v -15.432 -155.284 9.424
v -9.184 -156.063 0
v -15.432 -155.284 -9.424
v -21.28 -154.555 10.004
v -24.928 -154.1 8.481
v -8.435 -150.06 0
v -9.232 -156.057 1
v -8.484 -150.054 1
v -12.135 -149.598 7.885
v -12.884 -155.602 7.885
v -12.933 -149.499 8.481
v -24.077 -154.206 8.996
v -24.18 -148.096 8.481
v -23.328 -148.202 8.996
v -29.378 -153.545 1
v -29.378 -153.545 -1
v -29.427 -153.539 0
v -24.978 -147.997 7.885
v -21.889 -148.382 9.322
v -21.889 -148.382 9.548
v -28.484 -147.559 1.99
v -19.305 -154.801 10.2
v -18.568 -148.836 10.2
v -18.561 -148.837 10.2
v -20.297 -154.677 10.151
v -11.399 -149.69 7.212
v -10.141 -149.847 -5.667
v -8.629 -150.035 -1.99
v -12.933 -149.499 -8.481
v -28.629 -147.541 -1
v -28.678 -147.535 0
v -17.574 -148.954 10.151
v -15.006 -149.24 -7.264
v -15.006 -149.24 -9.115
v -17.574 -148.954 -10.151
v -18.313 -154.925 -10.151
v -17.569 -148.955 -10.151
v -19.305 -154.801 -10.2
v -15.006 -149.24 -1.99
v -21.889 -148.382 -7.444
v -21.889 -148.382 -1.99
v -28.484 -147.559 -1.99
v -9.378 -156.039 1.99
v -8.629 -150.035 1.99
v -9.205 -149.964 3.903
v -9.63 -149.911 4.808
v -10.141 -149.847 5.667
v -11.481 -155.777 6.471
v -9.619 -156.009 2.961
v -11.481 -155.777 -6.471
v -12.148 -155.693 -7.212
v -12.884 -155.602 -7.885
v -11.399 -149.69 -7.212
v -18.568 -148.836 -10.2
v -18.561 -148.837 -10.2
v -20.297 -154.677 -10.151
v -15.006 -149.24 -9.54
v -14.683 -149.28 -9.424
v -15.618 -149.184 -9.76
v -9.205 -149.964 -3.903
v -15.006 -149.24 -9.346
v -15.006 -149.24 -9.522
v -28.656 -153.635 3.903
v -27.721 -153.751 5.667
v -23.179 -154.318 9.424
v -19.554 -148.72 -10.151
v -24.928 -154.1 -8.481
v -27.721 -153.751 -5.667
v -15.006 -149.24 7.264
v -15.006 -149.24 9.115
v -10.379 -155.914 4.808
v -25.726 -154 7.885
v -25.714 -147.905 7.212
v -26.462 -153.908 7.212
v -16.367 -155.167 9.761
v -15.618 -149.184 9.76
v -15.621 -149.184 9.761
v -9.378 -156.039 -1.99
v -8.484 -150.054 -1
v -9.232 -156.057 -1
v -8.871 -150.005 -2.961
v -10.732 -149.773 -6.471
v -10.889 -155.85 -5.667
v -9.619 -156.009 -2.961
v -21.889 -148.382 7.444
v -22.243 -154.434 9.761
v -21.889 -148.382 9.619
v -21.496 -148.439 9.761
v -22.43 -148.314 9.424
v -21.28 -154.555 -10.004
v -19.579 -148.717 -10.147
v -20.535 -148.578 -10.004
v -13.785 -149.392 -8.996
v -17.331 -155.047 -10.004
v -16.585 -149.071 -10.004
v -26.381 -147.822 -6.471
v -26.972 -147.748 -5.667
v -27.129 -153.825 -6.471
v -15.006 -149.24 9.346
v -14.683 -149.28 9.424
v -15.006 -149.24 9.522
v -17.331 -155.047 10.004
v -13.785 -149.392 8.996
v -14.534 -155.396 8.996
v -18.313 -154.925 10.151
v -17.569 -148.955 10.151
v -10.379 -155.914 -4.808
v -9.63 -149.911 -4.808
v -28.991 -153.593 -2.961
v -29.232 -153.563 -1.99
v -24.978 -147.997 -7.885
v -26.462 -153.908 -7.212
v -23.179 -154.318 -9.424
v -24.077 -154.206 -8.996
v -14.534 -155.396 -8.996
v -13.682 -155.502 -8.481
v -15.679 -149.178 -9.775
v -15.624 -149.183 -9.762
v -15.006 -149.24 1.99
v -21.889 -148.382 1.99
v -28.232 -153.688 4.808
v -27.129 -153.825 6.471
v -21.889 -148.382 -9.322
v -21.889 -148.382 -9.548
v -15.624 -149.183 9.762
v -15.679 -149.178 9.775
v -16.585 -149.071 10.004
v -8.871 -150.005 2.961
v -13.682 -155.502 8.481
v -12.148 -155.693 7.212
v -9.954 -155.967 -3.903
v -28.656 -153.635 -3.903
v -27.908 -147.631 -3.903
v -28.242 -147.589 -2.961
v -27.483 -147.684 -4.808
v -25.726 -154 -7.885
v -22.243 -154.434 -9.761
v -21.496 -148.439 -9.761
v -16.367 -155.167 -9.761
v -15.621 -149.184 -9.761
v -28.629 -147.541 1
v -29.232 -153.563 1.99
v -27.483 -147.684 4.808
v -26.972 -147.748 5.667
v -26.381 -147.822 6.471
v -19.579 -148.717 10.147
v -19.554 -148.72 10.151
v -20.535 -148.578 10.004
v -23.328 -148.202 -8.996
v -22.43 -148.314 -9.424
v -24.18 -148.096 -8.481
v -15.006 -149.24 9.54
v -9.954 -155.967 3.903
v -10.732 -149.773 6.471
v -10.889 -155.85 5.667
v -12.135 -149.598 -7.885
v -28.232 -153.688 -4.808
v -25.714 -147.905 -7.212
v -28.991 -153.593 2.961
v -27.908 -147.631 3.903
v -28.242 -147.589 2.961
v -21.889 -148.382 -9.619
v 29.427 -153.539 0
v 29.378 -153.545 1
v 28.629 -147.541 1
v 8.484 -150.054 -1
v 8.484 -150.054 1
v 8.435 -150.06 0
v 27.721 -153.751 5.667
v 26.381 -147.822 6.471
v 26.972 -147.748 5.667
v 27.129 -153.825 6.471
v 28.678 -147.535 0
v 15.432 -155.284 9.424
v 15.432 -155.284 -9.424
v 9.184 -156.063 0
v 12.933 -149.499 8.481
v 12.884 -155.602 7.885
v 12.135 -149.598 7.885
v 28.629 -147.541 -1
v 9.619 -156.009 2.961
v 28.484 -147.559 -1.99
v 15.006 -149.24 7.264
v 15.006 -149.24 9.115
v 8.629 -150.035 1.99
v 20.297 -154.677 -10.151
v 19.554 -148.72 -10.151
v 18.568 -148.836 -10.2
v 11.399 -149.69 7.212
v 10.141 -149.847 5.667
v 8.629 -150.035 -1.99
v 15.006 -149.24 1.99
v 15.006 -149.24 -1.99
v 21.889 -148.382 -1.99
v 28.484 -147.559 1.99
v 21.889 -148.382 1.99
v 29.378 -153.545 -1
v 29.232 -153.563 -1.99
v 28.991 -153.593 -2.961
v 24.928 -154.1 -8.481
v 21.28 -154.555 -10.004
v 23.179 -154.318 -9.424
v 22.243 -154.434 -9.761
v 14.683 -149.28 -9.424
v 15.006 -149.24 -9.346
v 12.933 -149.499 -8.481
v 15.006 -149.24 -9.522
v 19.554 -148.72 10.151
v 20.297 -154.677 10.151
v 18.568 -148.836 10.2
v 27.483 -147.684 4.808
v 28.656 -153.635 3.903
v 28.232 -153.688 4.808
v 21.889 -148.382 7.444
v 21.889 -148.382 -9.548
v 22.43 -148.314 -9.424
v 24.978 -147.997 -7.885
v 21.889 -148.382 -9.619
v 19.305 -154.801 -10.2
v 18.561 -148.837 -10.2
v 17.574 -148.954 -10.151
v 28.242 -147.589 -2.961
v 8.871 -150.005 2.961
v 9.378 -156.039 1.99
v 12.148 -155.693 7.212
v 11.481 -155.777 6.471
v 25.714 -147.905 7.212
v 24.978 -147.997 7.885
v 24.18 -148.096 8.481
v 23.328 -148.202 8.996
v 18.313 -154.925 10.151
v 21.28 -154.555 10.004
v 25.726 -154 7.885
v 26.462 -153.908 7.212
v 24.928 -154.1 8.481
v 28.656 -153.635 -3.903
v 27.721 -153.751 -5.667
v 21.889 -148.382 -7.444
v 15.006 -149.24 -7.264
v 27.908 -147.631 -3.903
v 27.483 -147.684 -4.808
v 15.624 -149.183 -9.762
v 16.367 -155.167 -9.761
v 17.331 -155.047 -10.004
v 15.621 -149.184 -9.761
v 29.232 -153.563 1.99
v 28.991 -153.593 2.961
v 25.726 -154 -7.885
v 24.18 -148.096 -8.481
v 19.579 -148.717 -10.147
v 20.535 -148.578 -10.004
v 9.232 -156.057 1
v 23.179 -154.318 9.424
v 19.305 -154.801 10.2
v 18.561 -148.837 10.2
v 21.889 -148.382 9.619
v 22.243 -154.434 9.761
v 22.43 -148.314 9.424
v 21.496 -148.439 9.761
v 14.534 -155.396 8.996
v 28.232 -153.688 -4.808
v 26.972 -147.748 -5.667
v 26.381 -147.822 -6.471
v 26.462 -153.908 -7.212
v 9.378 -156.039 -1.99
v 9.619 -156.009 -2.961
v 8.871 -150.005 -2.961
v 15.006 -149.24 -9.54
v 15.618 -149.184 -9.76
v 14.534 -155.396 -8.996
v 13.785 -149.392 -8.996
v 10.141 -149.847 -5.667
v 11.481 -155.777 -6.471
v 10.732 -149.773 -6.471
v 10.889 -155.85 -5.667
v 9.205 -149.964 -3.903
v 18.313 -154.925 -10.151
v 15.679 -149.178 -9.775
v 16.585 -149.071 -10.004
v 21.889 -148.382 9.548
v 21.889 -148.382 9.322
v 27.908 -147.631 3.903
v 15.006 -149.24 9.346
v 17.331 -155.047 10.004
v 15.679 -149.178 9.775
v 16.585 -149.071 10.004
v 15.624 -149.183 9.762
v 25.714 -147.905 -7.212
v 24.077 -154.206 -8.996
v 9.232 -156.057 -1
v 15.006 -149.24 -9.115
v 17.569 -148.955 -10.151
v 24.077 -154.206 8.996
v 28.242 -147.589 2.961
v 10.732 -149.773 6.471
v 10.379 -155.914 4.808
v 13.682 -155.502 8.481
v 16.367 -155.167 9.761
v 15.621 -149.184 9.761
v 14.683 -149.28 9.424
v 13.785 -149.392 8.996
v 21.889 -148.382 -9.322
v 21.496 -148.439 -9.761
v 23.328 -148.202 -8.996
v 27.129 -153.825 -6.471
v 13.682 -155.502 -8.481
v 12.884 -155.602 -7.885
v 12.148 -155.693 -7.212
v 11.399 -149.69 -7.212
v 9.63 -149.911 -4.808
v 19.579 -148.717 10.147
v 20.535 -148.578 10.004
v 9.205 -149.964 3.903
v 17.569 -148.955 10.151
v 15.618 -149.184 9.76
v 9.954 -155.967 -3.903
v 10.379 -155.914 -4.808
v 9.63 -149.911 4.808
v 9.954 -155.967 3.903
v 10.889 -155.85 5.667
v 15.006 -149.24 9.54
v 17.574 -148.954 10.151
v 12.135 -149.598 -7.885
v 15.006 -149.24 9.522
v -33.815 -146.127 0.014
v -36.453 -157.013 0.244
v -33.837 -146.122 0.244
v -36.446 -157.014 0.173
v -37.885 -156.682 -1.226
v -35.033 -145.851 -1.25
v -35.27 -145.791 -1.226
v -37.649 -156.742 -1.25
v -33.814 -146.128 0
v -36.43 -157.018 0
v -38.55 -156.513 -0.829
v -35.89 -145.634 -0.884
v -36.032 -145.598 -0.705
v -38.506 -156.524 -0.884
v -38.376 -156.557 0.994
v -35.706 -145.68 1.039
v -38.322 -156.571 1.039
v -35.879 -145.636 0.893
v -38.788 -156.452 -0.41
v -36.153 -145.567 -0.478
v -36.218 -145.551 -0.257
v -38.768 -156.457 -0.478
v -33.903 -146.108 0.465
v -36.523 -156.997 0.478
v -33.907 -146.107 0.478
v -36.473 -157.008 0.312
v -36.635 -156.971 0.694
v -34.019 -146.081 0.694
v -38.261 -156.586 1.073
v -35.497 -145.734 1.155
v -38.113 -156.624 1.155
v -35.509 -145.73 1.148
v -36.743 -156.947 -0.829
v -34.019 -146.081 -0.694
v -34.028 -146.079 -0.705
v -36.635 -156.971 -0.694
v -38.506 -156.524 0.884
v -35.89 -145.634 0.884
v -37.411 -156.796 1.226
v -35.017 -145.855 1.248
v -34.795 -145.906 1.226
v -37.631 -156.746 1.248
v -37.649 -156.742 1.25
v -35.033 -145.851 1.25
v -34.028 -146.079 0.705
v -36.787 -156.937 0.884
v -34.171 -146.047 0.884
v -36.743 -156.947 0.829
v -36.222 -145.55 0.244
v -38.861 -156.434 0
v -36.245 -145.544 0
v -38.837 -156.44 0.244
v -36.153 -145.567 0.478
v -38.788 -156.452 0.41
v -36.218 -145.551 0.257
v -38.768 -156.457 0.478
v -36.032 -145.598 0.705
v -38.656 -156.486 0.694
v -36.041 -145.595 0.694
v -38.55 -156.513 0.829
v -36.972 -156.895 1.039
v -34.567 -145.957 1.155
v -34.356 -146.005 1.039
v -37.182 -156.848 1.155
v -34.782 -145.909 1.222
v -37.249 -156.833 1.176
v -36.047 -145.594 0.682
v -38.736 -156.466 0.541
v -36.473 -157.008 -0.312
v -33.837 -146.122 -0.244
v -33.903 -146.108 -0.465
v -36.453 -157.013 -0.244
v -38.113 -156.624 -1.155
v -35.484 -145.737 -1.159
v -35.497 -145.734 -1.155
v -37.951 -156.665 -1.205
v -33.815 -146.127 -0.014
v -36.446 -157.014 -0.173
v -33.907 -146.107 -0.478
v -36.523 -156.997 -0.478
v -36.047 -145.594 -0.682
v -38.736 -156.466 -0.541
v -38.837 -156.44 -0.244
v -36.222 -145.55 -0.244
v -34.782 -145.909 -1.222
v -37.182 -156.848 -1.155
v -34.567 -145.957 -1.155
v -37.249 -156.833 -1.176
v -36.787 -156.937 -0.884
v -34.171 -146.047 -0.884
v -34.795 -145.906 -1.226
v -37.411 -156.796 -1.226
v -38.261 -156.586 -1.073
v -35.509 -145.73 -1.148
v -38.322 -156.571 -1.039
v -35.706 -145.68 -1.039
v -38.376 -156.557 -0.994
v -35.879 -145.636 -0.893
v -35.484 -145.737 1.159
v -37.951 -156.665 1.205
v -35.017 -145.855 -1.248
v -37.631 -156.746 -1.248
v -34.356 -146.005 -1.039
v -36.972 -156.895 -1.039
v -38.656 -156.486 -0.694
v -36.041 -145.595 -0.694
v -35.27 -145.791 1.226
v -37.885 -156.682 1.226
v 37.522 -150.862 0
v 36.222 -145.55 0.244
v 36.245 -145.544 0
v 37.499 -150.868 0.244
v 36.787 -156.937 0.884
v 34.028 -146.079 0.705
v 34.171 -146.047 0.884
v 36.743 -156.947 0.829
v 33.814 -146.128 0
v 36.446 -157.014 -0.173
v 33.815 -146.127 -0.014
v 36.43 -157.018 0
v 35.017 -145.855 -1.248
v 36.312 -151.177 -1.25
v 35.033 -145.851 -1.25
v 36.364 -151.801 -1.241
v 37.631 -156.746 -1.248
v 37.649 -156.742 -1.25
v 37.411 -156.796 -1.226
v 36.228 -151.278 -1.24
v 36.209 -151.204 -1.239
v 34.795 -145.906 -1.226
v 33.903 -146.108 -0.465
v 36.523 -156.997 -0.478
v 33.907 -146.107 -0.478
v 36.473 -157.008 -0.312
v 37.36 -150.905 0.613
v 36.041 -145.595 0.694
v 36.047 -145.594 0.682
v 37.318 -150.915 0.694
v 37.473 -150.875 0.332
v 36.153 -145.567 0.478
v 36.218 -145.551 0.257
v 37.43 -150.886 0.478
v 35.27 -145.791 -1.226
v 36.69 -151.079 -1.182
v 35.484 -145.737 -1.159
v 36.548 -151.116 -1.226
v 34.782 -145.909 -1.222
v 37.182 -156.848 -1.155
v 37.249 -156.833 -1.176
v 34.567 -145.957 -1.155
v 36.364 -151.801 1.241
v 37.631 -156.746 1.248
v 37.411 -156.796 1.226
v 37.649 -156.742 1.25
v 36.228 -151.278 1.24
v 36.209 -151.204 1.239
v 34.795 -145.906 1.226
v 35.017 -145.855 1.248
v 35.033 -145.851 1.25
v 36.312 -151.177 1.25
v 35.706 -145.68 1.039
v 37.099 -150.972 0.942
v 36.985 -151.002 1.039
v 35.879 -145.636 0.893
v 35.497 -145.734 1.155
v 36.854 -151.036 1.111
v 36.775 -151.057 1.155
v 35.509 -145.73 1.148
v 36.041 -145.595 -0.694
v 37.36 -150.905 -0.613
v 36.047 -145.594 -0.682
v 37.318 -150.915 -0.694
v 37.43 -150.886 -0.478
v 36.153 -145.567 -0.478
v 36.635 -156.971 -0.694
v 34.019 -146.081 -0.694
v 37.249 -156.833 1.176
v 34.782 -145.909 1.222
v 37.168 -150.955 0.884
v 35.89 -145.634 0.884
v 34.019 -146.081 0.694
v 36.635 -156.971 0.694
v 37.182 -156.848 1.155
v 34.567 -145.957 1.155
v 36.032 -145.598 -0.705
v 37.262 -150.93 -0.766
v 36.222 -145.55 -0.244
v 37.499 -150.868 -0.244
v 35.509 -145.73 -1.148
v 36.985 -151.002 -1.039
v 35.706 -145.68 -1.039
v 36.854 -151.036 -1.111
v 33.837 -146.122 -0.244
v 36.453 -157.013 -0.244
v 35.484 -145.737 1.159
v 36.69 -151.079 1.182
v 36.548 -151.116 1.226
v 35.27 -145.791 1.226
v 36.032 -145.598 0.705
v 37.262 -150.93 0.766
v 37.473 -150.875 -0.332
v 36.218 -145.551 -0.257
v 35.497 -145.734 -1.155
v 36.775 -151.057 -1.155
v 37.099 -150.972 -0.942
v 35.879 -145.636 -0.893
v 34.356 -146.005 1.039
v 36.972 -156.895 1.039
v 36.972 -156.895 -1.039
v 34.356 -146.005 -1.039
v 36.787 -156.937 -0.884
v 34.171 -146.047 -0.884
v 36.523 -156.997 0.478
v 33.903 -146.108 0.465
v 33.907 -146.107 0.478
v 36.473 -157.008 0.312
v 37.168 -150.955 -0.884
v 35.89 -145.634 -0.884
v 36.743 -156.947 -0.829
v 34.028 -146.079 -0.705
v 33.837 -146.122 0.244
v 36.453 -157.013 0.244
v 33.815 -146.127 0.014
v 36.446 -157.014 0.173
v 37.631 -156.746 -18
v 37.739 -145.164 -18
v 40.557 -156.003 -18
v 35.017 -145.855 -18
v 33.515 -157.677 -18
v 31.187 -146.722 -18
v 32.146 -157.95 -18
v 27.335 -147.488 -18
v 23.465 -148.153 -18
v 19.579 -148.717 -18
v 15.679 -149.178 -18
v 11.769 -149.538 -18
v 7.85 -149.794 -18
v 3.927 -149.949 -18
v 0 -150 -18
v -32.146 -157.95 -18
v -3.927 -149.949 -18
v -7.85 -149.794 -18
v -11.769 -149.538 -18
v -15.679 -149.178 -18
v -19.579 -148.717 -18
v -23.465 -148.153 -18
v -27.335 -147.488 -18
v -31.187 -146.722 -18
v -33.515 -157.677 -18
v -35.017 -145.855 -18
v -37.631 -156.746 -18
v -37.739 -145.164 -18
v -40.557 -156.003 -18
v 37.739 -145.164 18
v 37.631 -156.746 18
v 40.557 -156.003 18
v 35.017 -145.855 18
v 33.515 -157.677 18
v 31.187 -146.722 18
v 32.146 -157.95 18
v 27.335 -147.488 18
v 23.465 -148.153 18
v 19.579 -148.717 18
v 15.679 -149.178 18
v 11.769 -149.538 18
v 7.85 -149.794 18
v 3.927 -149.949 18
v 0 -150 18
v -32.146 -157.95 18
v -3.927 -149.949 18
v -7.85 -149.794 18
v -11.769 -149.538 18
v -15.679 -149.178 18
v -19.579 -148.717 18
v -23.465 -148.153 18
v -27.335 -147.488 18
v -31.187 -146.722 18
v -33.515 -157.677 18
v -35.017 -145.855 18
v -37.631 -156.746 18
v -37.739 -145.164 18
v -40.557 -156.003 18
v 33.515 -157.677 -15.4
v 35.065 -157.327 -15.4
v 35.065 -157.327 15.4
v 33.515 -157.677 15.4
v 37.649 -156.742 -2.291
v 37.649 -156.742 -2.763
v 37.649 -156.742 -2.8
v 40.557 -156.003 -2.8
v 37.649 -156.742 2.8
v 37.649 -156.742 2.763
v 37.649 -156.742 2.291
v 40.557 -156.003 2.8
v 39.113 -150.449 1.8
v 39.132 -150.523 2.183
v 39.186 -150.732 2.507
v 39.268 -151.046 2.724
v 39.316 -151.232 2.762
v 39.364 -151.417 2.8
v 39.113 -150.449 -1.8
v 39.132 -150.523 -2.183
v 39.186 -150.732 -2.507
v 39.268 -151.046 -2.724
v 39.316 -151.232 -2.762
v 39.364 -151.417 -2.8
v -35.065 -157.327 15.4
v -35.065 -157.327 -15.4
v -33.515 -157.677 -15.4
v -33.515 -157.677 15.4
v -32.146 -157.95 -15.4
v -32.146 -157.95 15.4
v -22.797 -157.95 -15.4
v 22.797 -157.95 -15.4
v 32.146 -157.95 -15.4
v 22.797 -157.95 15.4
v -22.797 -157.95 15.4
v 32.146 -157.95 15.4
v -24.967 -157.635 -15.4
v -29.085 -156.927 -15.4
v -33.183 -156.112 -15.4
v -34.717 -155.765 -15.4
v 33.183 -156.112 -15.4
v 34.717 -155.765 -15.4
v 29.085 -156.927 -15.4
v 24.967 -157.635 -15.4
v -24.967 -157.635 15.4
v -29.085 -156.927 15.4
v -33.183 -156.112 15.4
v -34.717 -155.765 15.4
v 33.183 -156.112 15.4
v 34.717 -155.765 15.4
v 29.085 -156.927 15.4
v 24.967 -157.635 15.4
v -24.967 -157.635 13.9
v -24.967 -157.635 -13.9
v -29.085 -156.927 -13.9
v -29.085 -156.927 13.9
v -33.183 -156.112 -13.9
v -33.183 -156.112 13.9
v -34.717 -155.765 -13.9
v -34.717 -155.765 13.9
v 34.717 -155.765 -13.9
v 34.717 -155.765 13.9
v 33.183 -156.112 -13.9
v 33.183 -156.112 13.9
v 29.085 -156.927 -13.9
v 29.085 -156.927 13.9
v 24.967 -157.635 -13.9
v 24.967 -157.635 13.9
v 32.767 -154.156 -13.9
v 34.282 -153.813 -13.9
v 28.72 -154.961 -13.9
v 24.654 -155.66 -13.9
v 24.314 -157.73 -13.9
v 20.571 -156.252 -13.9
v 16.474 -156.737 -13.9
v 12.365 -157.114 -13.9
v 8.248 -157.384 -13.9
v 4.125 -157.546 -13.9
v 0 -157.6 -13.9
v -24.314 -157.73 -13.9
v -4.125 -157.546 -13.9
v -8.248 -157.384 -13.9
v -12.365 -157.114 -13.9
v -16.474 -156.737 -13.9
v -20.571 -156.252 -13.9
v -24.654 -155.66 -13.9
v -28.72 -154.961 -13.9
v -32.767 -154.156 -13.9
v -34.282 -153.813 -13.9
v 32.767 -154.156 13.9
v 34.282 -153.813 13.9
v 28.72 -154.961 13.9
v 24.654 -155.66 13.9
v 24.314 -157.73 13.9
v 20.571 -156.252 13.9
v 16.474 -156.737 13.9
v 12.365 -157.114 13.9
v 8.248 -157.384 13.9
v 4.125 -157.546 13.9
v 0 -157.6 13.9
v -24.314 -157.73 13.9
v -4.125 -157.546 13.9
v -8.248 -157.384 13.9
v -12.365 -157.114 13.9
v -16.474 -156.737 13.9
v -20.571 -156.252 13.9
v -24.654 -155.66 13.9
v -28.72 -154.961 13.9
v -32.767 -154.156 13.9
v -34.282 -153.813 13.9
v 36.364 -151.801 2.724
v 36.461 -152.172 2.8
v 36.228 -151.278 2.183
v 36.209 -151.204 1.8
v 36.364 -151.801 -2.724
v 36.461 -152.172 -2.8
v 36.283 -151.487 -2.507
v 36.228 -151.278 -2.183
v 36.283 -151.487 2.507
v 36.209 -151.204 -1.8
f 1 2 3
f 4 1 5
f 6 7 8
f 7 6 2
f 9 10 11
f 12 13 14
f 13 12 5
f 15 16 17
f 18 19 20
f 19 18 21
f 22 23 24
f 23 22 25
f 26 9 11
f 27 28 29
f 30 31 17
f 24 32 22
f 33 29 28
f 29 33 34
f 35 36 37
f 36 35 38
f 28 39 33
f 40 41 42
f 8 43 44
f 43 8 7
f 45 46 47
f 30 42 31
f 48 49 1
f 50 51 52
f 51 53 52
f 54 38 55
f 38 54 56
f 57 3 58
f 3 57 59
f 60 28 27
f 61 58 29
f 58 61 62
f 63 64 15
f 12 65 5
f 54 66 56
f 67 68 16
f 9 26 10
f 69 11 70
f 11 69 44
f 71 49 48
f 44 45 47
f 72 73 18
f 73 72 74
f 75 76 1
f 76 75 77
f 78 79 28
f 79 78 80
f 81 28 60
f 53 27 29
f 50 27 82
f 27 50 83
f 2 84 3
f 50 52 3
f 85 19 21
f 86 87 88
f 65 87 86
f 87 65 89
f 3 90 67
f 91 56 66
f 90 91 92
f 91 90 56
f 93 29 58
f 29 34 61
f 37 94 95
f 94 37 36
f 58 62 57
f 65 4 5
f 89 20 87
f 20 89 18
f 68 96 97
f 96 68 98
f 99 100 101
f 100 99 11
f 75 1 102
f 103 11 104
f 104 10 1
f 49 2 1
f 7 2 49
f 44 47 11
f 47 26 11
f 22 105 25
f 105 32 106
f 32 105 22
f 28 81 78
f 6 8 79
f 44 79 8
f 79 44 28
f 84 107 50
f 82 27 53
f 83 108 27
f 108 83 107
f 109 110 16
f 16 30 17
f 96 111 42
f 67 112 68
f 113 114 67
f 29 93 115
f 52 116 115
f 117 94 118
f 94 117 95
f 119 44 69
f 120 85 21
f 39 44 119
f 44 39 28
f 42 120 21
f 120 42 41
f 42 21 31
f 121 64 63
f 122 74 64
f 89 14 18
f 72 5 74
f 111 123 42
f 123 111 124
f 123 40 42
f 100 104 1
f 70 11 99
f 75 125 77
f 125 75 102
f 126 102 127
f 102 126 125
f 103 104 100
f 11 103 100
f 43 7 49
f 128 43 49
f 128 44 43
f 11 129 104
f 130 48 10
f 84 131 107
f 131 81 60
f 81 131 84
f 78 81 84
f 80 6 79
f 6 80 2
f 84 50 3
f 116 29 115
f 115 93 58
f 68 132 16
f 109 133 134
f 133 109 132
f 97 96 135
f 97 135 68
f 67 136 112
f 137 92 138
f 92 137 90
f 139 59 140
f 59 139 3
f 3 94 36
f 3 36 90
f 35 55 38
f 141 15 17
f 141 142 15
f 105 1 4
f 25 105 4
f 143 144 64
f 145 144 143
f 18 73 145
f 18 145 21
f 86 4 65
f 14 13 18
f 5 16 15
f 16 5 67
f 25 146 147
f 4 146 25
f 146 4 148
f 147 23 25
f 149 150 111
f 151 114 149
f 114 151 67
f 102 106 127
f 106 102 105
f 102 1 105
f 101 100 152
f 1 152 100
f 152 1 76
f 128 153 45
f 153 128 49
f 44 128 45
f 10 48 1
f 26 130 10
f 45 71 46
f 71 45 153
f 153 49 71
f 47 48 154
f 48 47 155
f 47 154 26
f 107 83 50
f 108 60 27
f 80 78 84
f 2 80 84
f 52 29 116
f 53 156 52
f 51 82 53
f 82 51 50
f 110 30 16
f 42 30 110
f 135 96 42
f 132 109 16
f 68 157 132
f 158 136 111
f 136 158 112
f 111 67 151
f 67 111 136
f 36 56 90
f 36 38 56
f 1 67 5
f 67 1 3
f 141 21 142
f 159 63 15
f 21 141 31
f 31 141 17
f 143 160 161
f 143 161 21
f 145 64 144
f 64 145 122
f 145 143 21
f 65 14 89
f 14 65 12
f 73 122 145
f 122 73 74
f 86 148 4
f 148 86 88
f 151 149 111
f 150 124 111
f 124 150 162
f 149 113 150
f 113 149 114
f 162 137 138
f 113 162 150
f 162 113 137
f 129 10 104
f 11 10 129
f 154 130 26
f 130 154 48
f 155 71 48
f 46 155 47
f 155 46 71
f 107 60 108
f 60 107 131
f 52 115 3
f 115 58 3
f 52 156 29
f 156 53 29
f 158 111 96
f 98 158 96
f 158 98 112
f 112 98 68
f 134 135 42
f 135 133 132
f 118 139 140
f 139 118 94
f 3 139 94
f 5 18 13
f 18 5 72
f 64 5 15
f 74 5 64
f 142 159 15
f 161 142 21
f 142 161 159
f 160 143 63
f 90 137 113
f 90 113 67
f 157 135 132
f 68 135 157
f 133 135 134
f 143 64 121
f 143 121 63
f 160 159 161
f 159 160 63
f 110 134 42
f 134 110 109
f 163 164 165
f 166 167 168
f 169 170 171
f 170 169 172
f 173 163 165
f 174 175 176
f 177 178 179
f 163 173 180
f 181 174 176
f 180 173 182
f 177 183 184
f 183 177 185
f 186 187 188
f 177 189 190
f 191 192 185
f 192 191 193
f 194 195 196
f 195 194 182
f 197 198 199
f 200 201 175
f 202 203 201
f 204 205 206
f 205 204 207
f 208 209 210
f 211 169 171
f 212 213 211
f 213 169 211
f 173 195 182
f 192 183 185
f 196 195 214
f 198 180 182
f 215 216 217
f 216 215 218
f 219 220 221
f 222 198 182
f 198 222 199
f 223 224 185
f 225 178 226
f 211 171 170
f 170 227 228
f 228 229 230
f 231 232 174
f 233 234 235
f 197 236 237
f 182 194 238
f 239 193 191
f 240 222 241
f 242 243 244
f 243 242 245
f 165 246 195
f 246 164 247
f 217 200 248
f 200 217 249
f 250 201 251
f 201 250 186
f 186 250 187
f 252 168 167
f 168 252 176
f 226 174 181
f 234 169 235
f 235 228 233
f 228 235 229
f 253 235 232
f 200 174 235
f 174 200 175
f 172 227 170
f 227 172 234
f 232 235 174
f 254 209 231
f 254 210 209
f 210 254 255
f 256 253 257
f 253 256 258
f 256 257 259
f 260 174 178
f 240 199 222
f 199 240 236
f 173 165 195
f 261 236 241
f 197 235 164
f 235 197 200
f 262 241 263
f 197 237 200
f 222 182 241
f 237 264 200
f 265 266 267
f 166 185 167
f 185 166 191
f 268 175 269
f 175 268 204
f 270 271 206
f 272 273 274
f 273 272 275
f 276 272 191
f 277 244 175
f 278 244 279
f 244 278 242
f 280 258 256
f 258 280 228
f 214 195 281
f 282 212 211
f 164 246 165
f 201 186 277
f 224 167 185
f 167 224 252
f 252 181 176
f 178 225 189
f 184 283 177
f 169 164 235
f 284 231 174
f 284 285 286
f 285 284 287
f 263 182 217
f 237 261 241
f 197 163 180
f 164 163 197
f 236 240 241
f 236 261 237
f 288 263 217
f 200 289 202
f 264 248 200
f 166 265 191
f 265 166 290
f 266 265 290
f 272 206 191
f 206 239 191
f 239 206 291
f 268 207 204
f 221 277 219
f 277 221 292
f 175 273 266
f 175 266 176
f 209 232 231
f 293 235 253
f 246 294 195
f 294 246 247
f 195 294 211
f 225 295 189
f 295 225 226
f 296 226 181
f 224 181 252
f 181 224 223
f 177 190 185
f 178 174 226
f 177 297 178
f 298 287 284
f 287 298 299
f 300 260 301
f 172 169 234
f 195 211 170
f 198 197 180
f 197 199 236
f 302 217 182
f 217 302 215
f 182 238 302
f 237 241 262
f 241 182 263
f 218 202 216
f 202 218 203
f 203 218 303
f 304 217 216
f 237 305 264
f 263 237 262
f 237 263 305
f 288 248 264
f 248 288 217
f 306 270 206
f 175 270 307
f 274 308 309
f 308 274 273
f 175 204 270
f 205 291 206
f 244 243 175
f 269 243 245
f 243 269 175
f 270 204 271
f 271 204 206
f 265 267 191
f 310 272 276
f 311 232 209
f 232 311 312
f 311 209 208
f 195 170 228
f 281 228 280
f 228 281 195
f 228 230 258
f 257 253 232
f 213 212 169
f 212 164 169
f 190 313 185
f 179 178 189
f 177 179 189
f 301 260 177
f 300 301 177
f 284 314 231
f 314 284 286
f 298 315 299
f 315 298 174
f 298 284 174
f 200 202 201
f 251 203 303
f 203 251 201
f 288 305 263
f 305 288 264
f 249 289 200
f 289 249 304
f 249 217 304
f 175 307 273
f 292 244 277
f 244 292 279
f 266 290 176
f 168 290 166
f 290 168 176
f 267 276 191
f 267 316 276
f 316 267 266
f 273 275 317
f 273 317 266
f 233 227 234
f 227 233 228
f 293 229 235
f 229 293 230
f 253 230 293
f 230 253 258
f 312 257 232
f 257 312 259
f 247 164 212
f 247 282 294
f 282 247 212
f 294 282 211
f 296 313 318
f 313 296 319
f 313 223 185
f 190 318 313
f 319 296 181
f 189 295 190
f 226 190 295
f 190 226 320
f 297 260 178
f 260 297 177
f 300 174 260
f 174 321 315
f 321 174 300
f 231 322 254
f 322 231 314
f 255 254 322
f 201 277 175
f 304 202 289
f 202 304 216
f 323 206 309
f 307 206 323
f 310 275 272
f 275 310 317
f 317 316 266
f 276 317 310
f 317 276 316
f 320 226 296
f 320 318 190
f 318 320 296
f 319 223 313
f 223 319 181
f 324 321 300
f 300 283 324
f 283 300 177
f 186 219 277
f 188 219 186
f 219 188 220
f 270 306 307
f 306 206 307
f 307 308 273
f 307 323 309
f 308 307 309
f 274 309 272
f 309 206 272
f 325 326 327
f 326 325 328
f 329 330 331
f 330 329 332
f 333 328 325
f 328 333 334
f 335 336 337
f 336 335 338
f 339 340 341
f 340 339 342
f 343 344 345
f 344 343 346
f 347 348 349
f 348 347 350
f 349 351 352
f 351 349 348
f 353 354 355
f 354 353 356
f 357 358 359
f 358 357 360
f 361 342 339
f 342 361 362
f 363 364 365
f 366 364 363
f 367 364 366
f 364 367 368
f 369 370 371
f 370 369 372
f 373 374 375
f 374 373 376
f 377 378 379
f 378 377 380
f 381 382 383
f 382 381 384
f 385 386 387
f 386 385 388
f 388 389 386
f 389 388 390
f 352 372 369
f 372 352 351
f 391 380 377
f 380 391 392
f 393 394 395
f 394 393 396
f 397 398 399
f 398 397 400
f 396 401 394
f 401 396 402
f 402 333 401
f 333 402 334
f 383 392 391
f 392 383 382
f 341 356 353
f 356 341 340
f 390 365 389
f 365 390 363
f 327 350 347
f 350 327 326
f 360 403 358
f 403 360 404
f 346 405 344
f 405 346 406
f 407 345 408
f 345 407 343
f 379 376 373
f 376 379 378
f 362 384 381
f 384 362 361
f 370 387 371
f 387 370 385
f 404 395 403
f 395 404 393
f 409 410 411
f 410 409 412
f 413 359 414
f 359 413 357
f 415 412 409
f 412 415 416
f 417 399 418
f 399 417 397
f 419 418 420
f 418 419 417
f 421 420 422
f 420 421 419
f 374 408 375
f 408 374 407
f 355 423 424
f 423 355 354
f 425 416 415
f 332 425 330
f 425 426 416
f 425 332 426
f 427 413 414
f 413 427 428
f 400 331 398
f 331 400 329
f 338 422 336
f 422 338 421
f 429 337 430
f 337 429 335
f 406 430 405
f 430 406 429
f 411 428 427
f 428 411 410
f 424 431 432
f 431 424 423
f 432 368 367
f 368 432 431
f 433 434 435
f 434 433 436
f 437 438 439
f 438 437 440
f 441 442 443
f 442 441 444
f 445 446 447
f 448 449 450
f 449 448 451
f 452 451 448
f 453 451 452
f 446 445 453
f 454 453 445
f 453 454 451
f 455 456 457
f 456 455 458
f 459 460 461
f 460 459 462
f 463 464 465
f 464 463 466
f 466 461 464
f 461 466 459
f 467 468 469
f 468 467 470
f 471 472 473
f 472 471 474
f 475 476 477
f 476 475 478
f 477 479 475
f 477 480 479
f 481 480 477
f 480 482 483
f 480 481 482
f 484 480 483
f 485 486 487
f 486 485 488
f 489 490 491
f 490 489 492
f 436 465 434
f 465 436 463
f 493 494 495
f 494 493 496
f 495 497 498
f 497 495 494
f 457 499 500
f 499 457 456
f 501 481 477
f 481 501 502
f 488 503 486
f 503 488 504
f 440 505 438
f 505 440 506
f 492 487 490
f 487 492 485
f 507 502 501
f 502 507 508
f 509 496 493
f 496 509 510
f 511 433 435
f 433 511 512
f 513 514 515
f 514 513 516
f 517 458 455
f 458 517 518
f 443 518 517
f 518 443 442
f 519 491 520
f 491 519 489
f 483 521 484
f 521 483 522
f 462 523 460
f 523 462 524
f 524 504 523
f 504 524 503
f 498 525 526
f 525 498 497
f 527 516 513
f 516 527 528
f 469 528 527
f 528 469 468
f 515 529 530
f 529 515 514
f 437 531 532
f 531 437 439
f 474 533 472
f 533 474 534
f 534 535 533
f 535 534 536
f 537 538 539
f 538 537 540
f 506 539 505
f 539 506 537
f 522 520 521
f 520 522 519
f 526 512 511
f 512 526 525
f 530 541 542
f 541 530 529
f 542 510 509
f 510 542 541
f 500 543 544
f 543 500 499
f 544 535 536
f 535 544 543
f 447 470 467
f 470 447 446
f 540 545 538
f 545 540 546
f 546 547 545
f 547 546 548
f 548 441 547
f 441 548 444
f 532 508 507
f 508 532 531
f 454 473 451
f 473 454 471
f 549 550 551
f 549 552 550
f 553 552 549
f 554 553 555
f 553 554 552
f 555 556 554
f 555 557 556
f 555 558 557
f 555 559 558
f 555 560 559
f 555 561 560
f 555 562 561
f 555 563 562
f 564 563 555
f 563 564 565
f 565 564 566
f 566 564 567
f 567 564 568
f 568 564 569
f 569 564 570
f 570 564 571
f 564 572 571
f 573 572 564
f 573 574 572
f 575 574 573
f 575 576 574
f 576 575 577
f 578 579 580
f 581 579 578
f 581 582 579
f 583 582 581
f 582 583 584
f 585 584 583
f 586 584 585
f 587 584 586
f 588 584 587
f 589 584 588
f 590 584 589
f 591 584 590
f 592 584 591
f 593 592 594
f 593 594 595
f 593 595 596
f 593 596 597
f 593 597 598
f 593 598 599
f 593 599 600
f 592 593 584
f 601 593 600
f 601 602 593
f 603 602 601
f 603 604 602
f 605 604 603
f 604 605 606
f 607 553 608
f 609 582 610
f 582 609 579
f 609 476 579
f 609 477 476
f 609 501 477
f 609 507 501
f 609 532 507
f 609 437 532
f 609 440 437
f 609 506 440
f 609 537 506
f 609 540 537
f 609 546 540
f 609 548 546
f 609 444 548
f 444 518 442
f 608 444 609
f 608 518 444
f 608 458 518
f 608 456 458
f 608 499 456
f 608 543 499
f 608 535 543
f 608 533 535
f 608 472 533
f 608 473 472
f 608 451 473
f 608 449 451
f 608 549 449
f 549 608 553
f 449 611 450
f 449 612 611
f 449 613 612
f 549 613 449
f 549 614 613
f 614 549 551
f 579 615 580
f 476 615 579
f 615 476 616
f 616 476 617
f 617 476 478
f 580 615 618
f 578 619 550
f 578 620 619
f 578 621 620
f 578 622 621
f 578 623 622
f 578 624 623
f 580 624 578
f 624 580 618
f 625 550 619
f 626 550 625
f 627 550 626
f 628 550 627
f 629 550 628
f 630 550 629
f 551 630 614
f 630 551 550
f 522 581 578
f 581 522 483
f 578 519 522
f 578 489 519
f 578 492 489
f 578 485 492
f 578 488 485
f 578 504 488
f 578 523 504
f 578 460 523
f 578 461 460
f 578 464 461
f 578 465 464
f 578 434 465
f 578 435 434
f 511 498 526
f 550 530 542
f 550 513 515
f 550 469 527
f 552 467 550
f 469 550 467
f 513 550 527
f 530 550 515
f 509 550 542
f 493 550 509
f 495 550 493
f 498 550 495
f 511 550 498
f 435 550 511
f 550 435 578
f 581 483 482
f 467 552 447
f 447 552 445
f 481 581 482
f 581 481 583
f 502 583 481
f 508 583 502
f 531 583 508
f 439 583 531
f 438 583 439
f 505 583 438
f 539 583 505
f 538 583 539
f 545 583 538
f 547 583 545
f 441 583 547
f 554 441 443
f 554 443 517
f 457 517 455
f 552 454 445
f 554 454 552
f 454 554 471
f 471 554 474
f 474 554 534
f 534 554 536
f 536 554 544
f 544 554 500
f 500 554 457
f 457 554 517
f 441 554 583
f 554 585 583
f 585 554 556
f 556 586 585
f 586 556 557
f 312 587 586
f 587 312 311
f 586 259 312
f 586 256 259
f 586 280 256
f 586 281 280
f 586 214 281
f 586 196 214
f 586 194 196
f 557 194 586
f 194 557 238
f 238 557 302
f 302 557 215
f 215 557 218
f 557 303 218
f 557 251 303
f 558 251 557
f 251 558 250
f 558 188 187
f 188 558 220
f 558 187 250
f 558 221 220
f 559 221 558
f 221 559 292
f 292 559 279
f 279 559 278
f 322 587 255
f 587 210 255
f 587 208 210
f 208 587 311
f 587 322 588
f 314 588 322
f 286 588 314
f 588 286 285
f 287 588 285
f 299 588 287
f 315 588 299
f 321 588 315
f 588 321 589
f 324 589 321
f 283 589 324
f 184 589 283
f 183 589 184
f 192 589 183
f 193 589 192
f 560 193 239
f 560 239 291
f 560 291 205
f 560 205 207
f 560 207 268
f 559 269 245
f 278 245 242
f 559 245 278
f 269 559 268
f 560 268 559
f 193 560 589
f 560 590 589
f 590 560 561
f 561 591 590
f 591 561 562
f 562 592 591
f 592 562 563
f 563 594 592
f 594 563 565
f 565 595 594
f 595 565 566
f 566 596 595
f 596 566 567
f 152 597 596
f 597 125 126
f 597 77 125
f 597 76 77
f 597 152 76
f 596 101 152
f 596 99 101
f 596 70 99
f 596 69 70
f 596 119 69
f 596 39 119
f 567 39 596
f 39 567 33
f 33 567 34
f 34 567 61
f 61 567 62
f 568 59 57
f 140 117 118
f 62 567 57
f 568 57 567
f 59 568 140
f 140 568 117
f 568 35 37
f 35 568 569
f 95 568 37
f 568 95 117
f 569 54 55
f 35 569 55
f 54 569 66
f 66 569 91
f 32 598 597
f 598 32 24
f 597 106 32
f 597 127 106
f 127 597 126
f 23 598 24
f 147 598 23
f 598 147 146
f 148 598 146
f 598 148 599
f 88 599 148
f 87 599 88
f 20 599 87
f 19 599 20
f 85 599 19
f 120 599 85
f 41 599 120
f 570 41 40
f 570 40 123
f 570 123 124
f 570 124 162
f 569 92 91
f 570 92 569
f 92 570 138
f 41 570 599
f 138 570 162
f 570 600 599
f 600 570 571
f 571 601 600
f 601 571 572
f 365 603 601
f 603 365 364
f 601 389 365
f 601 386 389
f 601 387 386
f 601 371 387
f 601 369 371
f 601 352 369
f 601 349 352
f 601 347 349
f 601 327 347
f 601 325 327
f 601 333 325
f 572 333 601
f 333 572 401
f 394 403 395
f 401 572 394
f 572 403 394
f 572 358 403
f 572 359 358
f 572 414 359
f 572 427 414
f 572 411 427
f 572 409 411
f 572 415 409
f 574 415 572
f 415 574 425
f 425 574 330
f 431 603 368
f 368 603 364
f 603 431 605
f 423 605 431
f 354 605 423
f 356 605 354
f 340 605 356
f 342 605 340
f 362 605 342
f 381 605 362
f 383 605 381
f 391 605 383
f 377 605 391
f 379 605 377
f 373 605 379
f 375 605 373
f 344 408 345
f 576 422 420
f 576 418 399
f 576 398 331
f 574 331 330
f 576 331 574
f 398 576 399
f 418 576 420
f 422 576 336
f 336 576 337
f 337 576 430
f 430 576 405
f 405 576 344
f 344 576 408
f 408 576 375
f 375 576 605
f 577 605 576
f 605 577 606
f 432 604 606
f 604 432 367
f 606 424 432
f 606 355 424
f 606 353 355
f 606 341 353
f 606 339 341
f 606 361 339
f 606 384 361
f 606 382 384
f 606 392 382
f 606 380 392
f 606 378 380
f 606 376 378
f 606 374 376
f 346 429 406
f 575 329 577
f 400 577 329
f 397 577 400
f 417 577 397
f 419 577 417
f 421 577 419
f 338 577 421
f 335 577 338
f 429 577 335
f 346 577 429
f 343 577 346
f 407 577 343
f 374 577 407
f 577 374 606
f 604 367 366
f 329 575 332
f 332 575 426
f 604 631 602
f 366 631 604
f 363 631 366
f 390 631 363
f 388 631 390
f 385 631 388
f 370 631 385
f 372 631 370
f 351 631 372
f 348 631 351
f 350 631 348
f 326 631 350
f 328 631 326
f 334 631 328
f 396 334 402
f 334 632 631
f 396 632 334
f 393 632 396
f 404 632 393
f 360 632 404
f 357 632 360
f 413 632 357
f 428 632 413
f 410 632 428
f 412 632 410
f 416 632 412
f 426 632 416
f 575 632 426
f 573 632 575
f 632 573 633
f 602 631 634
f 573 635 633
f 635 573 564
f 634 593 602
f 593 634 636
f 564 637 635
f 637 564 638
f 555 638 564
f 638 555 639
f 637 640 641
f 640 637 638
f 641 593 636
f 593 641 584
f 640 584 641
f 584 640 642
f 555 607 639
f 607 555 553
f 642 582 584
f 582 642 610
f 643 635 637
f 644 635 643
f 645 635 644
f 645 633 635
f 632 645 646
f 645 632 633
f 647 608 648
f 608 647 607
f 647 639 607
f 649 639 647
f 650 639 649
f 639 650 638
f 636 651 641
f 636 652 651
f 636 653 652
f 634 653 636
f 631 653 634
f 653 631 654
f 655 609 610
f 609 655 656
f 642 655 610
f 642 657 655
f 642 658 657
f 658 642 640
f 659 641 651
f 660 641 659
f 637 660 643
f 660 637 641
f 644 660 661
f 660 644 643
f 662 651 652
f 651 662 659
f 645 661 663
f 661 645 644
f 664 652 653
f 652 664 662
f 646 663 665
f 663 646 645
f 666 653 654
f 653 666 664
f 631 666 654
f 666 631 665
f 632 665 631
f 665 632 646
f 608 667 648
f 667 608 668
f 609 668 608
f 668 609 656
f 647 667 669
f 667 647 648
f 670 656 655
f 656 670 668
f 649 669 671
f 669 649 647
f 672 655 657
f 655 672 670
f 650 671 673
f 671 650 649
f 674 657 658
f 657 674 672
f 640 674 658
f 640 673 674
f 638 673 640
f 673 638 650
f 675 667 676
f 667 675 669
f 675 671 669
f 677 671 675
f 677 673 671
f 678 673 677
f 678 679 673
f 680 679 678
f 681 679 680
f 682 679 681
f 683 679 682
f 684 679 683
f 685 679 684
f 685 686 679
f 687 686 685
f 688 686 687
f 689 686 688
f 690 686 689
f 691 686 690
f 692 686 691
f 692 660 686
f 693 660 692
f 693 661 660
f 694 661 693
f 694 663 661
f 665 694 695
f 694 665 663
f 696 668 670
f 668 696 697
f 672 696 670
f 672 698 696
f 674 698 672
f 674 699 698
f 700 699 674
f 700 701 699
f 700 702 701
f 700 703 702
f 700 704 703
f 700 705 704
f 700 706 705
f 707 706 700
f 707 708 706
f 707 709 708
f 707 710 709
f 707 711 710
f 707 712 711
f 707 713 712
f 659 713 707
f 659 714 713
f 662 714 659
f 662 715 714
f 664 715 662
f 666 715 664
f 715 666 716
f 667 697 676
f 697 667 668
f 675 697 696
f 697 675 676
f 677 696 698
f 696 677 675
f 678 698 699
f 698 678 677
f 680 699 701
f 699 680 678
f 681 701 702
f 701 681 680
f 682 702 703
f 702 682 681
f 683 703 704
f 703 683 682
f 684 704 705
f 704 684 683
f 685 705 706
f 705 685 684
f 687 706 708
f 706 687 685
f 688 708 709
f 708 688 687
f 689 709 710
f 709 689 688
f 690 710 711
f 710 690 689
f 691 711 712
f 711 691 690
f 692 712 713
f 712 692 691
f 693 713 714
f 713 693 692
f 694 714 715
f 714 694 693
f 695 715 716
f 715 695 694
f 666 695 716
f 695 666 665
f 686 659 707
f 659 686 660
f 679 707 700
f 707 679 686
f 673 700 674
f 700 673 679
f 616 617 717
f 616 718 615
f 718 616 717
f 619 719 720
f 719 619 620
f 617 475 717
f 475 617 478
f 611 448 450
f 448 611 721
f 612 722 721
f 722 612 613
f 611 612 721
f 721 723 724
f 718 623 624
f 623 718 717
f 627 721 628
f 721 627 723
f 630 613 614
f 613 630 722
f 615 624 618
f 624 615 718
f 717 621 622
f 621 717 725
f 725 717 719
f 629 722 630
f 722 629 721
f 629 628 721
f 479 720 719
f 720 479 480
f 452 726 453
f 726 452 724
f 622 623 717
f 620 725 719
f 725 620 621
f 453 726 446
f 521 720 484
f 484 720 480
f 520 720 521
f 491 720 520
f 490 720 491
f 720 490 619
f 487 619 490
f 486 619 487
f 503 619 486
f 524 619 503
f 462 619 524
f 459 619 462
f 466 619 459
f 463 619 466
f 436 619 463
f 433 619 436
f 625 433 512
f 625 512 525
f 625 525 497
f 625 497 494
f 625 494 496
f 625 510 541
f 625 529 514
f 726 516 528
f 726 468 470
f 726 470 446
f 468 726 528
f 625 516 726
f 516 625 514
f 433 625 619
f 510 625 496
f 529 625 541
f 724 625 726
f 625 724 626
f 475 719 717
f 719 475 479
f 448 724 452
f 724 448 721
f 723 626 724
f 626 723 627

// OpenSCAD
// Render target: the helmet-side inner shell (PCB tray + recessed magnet pockets).
//   openscad -o ../stl/inner_shell.stl inner_shell.scad
include <enclosure.scad>
inner_shell();
